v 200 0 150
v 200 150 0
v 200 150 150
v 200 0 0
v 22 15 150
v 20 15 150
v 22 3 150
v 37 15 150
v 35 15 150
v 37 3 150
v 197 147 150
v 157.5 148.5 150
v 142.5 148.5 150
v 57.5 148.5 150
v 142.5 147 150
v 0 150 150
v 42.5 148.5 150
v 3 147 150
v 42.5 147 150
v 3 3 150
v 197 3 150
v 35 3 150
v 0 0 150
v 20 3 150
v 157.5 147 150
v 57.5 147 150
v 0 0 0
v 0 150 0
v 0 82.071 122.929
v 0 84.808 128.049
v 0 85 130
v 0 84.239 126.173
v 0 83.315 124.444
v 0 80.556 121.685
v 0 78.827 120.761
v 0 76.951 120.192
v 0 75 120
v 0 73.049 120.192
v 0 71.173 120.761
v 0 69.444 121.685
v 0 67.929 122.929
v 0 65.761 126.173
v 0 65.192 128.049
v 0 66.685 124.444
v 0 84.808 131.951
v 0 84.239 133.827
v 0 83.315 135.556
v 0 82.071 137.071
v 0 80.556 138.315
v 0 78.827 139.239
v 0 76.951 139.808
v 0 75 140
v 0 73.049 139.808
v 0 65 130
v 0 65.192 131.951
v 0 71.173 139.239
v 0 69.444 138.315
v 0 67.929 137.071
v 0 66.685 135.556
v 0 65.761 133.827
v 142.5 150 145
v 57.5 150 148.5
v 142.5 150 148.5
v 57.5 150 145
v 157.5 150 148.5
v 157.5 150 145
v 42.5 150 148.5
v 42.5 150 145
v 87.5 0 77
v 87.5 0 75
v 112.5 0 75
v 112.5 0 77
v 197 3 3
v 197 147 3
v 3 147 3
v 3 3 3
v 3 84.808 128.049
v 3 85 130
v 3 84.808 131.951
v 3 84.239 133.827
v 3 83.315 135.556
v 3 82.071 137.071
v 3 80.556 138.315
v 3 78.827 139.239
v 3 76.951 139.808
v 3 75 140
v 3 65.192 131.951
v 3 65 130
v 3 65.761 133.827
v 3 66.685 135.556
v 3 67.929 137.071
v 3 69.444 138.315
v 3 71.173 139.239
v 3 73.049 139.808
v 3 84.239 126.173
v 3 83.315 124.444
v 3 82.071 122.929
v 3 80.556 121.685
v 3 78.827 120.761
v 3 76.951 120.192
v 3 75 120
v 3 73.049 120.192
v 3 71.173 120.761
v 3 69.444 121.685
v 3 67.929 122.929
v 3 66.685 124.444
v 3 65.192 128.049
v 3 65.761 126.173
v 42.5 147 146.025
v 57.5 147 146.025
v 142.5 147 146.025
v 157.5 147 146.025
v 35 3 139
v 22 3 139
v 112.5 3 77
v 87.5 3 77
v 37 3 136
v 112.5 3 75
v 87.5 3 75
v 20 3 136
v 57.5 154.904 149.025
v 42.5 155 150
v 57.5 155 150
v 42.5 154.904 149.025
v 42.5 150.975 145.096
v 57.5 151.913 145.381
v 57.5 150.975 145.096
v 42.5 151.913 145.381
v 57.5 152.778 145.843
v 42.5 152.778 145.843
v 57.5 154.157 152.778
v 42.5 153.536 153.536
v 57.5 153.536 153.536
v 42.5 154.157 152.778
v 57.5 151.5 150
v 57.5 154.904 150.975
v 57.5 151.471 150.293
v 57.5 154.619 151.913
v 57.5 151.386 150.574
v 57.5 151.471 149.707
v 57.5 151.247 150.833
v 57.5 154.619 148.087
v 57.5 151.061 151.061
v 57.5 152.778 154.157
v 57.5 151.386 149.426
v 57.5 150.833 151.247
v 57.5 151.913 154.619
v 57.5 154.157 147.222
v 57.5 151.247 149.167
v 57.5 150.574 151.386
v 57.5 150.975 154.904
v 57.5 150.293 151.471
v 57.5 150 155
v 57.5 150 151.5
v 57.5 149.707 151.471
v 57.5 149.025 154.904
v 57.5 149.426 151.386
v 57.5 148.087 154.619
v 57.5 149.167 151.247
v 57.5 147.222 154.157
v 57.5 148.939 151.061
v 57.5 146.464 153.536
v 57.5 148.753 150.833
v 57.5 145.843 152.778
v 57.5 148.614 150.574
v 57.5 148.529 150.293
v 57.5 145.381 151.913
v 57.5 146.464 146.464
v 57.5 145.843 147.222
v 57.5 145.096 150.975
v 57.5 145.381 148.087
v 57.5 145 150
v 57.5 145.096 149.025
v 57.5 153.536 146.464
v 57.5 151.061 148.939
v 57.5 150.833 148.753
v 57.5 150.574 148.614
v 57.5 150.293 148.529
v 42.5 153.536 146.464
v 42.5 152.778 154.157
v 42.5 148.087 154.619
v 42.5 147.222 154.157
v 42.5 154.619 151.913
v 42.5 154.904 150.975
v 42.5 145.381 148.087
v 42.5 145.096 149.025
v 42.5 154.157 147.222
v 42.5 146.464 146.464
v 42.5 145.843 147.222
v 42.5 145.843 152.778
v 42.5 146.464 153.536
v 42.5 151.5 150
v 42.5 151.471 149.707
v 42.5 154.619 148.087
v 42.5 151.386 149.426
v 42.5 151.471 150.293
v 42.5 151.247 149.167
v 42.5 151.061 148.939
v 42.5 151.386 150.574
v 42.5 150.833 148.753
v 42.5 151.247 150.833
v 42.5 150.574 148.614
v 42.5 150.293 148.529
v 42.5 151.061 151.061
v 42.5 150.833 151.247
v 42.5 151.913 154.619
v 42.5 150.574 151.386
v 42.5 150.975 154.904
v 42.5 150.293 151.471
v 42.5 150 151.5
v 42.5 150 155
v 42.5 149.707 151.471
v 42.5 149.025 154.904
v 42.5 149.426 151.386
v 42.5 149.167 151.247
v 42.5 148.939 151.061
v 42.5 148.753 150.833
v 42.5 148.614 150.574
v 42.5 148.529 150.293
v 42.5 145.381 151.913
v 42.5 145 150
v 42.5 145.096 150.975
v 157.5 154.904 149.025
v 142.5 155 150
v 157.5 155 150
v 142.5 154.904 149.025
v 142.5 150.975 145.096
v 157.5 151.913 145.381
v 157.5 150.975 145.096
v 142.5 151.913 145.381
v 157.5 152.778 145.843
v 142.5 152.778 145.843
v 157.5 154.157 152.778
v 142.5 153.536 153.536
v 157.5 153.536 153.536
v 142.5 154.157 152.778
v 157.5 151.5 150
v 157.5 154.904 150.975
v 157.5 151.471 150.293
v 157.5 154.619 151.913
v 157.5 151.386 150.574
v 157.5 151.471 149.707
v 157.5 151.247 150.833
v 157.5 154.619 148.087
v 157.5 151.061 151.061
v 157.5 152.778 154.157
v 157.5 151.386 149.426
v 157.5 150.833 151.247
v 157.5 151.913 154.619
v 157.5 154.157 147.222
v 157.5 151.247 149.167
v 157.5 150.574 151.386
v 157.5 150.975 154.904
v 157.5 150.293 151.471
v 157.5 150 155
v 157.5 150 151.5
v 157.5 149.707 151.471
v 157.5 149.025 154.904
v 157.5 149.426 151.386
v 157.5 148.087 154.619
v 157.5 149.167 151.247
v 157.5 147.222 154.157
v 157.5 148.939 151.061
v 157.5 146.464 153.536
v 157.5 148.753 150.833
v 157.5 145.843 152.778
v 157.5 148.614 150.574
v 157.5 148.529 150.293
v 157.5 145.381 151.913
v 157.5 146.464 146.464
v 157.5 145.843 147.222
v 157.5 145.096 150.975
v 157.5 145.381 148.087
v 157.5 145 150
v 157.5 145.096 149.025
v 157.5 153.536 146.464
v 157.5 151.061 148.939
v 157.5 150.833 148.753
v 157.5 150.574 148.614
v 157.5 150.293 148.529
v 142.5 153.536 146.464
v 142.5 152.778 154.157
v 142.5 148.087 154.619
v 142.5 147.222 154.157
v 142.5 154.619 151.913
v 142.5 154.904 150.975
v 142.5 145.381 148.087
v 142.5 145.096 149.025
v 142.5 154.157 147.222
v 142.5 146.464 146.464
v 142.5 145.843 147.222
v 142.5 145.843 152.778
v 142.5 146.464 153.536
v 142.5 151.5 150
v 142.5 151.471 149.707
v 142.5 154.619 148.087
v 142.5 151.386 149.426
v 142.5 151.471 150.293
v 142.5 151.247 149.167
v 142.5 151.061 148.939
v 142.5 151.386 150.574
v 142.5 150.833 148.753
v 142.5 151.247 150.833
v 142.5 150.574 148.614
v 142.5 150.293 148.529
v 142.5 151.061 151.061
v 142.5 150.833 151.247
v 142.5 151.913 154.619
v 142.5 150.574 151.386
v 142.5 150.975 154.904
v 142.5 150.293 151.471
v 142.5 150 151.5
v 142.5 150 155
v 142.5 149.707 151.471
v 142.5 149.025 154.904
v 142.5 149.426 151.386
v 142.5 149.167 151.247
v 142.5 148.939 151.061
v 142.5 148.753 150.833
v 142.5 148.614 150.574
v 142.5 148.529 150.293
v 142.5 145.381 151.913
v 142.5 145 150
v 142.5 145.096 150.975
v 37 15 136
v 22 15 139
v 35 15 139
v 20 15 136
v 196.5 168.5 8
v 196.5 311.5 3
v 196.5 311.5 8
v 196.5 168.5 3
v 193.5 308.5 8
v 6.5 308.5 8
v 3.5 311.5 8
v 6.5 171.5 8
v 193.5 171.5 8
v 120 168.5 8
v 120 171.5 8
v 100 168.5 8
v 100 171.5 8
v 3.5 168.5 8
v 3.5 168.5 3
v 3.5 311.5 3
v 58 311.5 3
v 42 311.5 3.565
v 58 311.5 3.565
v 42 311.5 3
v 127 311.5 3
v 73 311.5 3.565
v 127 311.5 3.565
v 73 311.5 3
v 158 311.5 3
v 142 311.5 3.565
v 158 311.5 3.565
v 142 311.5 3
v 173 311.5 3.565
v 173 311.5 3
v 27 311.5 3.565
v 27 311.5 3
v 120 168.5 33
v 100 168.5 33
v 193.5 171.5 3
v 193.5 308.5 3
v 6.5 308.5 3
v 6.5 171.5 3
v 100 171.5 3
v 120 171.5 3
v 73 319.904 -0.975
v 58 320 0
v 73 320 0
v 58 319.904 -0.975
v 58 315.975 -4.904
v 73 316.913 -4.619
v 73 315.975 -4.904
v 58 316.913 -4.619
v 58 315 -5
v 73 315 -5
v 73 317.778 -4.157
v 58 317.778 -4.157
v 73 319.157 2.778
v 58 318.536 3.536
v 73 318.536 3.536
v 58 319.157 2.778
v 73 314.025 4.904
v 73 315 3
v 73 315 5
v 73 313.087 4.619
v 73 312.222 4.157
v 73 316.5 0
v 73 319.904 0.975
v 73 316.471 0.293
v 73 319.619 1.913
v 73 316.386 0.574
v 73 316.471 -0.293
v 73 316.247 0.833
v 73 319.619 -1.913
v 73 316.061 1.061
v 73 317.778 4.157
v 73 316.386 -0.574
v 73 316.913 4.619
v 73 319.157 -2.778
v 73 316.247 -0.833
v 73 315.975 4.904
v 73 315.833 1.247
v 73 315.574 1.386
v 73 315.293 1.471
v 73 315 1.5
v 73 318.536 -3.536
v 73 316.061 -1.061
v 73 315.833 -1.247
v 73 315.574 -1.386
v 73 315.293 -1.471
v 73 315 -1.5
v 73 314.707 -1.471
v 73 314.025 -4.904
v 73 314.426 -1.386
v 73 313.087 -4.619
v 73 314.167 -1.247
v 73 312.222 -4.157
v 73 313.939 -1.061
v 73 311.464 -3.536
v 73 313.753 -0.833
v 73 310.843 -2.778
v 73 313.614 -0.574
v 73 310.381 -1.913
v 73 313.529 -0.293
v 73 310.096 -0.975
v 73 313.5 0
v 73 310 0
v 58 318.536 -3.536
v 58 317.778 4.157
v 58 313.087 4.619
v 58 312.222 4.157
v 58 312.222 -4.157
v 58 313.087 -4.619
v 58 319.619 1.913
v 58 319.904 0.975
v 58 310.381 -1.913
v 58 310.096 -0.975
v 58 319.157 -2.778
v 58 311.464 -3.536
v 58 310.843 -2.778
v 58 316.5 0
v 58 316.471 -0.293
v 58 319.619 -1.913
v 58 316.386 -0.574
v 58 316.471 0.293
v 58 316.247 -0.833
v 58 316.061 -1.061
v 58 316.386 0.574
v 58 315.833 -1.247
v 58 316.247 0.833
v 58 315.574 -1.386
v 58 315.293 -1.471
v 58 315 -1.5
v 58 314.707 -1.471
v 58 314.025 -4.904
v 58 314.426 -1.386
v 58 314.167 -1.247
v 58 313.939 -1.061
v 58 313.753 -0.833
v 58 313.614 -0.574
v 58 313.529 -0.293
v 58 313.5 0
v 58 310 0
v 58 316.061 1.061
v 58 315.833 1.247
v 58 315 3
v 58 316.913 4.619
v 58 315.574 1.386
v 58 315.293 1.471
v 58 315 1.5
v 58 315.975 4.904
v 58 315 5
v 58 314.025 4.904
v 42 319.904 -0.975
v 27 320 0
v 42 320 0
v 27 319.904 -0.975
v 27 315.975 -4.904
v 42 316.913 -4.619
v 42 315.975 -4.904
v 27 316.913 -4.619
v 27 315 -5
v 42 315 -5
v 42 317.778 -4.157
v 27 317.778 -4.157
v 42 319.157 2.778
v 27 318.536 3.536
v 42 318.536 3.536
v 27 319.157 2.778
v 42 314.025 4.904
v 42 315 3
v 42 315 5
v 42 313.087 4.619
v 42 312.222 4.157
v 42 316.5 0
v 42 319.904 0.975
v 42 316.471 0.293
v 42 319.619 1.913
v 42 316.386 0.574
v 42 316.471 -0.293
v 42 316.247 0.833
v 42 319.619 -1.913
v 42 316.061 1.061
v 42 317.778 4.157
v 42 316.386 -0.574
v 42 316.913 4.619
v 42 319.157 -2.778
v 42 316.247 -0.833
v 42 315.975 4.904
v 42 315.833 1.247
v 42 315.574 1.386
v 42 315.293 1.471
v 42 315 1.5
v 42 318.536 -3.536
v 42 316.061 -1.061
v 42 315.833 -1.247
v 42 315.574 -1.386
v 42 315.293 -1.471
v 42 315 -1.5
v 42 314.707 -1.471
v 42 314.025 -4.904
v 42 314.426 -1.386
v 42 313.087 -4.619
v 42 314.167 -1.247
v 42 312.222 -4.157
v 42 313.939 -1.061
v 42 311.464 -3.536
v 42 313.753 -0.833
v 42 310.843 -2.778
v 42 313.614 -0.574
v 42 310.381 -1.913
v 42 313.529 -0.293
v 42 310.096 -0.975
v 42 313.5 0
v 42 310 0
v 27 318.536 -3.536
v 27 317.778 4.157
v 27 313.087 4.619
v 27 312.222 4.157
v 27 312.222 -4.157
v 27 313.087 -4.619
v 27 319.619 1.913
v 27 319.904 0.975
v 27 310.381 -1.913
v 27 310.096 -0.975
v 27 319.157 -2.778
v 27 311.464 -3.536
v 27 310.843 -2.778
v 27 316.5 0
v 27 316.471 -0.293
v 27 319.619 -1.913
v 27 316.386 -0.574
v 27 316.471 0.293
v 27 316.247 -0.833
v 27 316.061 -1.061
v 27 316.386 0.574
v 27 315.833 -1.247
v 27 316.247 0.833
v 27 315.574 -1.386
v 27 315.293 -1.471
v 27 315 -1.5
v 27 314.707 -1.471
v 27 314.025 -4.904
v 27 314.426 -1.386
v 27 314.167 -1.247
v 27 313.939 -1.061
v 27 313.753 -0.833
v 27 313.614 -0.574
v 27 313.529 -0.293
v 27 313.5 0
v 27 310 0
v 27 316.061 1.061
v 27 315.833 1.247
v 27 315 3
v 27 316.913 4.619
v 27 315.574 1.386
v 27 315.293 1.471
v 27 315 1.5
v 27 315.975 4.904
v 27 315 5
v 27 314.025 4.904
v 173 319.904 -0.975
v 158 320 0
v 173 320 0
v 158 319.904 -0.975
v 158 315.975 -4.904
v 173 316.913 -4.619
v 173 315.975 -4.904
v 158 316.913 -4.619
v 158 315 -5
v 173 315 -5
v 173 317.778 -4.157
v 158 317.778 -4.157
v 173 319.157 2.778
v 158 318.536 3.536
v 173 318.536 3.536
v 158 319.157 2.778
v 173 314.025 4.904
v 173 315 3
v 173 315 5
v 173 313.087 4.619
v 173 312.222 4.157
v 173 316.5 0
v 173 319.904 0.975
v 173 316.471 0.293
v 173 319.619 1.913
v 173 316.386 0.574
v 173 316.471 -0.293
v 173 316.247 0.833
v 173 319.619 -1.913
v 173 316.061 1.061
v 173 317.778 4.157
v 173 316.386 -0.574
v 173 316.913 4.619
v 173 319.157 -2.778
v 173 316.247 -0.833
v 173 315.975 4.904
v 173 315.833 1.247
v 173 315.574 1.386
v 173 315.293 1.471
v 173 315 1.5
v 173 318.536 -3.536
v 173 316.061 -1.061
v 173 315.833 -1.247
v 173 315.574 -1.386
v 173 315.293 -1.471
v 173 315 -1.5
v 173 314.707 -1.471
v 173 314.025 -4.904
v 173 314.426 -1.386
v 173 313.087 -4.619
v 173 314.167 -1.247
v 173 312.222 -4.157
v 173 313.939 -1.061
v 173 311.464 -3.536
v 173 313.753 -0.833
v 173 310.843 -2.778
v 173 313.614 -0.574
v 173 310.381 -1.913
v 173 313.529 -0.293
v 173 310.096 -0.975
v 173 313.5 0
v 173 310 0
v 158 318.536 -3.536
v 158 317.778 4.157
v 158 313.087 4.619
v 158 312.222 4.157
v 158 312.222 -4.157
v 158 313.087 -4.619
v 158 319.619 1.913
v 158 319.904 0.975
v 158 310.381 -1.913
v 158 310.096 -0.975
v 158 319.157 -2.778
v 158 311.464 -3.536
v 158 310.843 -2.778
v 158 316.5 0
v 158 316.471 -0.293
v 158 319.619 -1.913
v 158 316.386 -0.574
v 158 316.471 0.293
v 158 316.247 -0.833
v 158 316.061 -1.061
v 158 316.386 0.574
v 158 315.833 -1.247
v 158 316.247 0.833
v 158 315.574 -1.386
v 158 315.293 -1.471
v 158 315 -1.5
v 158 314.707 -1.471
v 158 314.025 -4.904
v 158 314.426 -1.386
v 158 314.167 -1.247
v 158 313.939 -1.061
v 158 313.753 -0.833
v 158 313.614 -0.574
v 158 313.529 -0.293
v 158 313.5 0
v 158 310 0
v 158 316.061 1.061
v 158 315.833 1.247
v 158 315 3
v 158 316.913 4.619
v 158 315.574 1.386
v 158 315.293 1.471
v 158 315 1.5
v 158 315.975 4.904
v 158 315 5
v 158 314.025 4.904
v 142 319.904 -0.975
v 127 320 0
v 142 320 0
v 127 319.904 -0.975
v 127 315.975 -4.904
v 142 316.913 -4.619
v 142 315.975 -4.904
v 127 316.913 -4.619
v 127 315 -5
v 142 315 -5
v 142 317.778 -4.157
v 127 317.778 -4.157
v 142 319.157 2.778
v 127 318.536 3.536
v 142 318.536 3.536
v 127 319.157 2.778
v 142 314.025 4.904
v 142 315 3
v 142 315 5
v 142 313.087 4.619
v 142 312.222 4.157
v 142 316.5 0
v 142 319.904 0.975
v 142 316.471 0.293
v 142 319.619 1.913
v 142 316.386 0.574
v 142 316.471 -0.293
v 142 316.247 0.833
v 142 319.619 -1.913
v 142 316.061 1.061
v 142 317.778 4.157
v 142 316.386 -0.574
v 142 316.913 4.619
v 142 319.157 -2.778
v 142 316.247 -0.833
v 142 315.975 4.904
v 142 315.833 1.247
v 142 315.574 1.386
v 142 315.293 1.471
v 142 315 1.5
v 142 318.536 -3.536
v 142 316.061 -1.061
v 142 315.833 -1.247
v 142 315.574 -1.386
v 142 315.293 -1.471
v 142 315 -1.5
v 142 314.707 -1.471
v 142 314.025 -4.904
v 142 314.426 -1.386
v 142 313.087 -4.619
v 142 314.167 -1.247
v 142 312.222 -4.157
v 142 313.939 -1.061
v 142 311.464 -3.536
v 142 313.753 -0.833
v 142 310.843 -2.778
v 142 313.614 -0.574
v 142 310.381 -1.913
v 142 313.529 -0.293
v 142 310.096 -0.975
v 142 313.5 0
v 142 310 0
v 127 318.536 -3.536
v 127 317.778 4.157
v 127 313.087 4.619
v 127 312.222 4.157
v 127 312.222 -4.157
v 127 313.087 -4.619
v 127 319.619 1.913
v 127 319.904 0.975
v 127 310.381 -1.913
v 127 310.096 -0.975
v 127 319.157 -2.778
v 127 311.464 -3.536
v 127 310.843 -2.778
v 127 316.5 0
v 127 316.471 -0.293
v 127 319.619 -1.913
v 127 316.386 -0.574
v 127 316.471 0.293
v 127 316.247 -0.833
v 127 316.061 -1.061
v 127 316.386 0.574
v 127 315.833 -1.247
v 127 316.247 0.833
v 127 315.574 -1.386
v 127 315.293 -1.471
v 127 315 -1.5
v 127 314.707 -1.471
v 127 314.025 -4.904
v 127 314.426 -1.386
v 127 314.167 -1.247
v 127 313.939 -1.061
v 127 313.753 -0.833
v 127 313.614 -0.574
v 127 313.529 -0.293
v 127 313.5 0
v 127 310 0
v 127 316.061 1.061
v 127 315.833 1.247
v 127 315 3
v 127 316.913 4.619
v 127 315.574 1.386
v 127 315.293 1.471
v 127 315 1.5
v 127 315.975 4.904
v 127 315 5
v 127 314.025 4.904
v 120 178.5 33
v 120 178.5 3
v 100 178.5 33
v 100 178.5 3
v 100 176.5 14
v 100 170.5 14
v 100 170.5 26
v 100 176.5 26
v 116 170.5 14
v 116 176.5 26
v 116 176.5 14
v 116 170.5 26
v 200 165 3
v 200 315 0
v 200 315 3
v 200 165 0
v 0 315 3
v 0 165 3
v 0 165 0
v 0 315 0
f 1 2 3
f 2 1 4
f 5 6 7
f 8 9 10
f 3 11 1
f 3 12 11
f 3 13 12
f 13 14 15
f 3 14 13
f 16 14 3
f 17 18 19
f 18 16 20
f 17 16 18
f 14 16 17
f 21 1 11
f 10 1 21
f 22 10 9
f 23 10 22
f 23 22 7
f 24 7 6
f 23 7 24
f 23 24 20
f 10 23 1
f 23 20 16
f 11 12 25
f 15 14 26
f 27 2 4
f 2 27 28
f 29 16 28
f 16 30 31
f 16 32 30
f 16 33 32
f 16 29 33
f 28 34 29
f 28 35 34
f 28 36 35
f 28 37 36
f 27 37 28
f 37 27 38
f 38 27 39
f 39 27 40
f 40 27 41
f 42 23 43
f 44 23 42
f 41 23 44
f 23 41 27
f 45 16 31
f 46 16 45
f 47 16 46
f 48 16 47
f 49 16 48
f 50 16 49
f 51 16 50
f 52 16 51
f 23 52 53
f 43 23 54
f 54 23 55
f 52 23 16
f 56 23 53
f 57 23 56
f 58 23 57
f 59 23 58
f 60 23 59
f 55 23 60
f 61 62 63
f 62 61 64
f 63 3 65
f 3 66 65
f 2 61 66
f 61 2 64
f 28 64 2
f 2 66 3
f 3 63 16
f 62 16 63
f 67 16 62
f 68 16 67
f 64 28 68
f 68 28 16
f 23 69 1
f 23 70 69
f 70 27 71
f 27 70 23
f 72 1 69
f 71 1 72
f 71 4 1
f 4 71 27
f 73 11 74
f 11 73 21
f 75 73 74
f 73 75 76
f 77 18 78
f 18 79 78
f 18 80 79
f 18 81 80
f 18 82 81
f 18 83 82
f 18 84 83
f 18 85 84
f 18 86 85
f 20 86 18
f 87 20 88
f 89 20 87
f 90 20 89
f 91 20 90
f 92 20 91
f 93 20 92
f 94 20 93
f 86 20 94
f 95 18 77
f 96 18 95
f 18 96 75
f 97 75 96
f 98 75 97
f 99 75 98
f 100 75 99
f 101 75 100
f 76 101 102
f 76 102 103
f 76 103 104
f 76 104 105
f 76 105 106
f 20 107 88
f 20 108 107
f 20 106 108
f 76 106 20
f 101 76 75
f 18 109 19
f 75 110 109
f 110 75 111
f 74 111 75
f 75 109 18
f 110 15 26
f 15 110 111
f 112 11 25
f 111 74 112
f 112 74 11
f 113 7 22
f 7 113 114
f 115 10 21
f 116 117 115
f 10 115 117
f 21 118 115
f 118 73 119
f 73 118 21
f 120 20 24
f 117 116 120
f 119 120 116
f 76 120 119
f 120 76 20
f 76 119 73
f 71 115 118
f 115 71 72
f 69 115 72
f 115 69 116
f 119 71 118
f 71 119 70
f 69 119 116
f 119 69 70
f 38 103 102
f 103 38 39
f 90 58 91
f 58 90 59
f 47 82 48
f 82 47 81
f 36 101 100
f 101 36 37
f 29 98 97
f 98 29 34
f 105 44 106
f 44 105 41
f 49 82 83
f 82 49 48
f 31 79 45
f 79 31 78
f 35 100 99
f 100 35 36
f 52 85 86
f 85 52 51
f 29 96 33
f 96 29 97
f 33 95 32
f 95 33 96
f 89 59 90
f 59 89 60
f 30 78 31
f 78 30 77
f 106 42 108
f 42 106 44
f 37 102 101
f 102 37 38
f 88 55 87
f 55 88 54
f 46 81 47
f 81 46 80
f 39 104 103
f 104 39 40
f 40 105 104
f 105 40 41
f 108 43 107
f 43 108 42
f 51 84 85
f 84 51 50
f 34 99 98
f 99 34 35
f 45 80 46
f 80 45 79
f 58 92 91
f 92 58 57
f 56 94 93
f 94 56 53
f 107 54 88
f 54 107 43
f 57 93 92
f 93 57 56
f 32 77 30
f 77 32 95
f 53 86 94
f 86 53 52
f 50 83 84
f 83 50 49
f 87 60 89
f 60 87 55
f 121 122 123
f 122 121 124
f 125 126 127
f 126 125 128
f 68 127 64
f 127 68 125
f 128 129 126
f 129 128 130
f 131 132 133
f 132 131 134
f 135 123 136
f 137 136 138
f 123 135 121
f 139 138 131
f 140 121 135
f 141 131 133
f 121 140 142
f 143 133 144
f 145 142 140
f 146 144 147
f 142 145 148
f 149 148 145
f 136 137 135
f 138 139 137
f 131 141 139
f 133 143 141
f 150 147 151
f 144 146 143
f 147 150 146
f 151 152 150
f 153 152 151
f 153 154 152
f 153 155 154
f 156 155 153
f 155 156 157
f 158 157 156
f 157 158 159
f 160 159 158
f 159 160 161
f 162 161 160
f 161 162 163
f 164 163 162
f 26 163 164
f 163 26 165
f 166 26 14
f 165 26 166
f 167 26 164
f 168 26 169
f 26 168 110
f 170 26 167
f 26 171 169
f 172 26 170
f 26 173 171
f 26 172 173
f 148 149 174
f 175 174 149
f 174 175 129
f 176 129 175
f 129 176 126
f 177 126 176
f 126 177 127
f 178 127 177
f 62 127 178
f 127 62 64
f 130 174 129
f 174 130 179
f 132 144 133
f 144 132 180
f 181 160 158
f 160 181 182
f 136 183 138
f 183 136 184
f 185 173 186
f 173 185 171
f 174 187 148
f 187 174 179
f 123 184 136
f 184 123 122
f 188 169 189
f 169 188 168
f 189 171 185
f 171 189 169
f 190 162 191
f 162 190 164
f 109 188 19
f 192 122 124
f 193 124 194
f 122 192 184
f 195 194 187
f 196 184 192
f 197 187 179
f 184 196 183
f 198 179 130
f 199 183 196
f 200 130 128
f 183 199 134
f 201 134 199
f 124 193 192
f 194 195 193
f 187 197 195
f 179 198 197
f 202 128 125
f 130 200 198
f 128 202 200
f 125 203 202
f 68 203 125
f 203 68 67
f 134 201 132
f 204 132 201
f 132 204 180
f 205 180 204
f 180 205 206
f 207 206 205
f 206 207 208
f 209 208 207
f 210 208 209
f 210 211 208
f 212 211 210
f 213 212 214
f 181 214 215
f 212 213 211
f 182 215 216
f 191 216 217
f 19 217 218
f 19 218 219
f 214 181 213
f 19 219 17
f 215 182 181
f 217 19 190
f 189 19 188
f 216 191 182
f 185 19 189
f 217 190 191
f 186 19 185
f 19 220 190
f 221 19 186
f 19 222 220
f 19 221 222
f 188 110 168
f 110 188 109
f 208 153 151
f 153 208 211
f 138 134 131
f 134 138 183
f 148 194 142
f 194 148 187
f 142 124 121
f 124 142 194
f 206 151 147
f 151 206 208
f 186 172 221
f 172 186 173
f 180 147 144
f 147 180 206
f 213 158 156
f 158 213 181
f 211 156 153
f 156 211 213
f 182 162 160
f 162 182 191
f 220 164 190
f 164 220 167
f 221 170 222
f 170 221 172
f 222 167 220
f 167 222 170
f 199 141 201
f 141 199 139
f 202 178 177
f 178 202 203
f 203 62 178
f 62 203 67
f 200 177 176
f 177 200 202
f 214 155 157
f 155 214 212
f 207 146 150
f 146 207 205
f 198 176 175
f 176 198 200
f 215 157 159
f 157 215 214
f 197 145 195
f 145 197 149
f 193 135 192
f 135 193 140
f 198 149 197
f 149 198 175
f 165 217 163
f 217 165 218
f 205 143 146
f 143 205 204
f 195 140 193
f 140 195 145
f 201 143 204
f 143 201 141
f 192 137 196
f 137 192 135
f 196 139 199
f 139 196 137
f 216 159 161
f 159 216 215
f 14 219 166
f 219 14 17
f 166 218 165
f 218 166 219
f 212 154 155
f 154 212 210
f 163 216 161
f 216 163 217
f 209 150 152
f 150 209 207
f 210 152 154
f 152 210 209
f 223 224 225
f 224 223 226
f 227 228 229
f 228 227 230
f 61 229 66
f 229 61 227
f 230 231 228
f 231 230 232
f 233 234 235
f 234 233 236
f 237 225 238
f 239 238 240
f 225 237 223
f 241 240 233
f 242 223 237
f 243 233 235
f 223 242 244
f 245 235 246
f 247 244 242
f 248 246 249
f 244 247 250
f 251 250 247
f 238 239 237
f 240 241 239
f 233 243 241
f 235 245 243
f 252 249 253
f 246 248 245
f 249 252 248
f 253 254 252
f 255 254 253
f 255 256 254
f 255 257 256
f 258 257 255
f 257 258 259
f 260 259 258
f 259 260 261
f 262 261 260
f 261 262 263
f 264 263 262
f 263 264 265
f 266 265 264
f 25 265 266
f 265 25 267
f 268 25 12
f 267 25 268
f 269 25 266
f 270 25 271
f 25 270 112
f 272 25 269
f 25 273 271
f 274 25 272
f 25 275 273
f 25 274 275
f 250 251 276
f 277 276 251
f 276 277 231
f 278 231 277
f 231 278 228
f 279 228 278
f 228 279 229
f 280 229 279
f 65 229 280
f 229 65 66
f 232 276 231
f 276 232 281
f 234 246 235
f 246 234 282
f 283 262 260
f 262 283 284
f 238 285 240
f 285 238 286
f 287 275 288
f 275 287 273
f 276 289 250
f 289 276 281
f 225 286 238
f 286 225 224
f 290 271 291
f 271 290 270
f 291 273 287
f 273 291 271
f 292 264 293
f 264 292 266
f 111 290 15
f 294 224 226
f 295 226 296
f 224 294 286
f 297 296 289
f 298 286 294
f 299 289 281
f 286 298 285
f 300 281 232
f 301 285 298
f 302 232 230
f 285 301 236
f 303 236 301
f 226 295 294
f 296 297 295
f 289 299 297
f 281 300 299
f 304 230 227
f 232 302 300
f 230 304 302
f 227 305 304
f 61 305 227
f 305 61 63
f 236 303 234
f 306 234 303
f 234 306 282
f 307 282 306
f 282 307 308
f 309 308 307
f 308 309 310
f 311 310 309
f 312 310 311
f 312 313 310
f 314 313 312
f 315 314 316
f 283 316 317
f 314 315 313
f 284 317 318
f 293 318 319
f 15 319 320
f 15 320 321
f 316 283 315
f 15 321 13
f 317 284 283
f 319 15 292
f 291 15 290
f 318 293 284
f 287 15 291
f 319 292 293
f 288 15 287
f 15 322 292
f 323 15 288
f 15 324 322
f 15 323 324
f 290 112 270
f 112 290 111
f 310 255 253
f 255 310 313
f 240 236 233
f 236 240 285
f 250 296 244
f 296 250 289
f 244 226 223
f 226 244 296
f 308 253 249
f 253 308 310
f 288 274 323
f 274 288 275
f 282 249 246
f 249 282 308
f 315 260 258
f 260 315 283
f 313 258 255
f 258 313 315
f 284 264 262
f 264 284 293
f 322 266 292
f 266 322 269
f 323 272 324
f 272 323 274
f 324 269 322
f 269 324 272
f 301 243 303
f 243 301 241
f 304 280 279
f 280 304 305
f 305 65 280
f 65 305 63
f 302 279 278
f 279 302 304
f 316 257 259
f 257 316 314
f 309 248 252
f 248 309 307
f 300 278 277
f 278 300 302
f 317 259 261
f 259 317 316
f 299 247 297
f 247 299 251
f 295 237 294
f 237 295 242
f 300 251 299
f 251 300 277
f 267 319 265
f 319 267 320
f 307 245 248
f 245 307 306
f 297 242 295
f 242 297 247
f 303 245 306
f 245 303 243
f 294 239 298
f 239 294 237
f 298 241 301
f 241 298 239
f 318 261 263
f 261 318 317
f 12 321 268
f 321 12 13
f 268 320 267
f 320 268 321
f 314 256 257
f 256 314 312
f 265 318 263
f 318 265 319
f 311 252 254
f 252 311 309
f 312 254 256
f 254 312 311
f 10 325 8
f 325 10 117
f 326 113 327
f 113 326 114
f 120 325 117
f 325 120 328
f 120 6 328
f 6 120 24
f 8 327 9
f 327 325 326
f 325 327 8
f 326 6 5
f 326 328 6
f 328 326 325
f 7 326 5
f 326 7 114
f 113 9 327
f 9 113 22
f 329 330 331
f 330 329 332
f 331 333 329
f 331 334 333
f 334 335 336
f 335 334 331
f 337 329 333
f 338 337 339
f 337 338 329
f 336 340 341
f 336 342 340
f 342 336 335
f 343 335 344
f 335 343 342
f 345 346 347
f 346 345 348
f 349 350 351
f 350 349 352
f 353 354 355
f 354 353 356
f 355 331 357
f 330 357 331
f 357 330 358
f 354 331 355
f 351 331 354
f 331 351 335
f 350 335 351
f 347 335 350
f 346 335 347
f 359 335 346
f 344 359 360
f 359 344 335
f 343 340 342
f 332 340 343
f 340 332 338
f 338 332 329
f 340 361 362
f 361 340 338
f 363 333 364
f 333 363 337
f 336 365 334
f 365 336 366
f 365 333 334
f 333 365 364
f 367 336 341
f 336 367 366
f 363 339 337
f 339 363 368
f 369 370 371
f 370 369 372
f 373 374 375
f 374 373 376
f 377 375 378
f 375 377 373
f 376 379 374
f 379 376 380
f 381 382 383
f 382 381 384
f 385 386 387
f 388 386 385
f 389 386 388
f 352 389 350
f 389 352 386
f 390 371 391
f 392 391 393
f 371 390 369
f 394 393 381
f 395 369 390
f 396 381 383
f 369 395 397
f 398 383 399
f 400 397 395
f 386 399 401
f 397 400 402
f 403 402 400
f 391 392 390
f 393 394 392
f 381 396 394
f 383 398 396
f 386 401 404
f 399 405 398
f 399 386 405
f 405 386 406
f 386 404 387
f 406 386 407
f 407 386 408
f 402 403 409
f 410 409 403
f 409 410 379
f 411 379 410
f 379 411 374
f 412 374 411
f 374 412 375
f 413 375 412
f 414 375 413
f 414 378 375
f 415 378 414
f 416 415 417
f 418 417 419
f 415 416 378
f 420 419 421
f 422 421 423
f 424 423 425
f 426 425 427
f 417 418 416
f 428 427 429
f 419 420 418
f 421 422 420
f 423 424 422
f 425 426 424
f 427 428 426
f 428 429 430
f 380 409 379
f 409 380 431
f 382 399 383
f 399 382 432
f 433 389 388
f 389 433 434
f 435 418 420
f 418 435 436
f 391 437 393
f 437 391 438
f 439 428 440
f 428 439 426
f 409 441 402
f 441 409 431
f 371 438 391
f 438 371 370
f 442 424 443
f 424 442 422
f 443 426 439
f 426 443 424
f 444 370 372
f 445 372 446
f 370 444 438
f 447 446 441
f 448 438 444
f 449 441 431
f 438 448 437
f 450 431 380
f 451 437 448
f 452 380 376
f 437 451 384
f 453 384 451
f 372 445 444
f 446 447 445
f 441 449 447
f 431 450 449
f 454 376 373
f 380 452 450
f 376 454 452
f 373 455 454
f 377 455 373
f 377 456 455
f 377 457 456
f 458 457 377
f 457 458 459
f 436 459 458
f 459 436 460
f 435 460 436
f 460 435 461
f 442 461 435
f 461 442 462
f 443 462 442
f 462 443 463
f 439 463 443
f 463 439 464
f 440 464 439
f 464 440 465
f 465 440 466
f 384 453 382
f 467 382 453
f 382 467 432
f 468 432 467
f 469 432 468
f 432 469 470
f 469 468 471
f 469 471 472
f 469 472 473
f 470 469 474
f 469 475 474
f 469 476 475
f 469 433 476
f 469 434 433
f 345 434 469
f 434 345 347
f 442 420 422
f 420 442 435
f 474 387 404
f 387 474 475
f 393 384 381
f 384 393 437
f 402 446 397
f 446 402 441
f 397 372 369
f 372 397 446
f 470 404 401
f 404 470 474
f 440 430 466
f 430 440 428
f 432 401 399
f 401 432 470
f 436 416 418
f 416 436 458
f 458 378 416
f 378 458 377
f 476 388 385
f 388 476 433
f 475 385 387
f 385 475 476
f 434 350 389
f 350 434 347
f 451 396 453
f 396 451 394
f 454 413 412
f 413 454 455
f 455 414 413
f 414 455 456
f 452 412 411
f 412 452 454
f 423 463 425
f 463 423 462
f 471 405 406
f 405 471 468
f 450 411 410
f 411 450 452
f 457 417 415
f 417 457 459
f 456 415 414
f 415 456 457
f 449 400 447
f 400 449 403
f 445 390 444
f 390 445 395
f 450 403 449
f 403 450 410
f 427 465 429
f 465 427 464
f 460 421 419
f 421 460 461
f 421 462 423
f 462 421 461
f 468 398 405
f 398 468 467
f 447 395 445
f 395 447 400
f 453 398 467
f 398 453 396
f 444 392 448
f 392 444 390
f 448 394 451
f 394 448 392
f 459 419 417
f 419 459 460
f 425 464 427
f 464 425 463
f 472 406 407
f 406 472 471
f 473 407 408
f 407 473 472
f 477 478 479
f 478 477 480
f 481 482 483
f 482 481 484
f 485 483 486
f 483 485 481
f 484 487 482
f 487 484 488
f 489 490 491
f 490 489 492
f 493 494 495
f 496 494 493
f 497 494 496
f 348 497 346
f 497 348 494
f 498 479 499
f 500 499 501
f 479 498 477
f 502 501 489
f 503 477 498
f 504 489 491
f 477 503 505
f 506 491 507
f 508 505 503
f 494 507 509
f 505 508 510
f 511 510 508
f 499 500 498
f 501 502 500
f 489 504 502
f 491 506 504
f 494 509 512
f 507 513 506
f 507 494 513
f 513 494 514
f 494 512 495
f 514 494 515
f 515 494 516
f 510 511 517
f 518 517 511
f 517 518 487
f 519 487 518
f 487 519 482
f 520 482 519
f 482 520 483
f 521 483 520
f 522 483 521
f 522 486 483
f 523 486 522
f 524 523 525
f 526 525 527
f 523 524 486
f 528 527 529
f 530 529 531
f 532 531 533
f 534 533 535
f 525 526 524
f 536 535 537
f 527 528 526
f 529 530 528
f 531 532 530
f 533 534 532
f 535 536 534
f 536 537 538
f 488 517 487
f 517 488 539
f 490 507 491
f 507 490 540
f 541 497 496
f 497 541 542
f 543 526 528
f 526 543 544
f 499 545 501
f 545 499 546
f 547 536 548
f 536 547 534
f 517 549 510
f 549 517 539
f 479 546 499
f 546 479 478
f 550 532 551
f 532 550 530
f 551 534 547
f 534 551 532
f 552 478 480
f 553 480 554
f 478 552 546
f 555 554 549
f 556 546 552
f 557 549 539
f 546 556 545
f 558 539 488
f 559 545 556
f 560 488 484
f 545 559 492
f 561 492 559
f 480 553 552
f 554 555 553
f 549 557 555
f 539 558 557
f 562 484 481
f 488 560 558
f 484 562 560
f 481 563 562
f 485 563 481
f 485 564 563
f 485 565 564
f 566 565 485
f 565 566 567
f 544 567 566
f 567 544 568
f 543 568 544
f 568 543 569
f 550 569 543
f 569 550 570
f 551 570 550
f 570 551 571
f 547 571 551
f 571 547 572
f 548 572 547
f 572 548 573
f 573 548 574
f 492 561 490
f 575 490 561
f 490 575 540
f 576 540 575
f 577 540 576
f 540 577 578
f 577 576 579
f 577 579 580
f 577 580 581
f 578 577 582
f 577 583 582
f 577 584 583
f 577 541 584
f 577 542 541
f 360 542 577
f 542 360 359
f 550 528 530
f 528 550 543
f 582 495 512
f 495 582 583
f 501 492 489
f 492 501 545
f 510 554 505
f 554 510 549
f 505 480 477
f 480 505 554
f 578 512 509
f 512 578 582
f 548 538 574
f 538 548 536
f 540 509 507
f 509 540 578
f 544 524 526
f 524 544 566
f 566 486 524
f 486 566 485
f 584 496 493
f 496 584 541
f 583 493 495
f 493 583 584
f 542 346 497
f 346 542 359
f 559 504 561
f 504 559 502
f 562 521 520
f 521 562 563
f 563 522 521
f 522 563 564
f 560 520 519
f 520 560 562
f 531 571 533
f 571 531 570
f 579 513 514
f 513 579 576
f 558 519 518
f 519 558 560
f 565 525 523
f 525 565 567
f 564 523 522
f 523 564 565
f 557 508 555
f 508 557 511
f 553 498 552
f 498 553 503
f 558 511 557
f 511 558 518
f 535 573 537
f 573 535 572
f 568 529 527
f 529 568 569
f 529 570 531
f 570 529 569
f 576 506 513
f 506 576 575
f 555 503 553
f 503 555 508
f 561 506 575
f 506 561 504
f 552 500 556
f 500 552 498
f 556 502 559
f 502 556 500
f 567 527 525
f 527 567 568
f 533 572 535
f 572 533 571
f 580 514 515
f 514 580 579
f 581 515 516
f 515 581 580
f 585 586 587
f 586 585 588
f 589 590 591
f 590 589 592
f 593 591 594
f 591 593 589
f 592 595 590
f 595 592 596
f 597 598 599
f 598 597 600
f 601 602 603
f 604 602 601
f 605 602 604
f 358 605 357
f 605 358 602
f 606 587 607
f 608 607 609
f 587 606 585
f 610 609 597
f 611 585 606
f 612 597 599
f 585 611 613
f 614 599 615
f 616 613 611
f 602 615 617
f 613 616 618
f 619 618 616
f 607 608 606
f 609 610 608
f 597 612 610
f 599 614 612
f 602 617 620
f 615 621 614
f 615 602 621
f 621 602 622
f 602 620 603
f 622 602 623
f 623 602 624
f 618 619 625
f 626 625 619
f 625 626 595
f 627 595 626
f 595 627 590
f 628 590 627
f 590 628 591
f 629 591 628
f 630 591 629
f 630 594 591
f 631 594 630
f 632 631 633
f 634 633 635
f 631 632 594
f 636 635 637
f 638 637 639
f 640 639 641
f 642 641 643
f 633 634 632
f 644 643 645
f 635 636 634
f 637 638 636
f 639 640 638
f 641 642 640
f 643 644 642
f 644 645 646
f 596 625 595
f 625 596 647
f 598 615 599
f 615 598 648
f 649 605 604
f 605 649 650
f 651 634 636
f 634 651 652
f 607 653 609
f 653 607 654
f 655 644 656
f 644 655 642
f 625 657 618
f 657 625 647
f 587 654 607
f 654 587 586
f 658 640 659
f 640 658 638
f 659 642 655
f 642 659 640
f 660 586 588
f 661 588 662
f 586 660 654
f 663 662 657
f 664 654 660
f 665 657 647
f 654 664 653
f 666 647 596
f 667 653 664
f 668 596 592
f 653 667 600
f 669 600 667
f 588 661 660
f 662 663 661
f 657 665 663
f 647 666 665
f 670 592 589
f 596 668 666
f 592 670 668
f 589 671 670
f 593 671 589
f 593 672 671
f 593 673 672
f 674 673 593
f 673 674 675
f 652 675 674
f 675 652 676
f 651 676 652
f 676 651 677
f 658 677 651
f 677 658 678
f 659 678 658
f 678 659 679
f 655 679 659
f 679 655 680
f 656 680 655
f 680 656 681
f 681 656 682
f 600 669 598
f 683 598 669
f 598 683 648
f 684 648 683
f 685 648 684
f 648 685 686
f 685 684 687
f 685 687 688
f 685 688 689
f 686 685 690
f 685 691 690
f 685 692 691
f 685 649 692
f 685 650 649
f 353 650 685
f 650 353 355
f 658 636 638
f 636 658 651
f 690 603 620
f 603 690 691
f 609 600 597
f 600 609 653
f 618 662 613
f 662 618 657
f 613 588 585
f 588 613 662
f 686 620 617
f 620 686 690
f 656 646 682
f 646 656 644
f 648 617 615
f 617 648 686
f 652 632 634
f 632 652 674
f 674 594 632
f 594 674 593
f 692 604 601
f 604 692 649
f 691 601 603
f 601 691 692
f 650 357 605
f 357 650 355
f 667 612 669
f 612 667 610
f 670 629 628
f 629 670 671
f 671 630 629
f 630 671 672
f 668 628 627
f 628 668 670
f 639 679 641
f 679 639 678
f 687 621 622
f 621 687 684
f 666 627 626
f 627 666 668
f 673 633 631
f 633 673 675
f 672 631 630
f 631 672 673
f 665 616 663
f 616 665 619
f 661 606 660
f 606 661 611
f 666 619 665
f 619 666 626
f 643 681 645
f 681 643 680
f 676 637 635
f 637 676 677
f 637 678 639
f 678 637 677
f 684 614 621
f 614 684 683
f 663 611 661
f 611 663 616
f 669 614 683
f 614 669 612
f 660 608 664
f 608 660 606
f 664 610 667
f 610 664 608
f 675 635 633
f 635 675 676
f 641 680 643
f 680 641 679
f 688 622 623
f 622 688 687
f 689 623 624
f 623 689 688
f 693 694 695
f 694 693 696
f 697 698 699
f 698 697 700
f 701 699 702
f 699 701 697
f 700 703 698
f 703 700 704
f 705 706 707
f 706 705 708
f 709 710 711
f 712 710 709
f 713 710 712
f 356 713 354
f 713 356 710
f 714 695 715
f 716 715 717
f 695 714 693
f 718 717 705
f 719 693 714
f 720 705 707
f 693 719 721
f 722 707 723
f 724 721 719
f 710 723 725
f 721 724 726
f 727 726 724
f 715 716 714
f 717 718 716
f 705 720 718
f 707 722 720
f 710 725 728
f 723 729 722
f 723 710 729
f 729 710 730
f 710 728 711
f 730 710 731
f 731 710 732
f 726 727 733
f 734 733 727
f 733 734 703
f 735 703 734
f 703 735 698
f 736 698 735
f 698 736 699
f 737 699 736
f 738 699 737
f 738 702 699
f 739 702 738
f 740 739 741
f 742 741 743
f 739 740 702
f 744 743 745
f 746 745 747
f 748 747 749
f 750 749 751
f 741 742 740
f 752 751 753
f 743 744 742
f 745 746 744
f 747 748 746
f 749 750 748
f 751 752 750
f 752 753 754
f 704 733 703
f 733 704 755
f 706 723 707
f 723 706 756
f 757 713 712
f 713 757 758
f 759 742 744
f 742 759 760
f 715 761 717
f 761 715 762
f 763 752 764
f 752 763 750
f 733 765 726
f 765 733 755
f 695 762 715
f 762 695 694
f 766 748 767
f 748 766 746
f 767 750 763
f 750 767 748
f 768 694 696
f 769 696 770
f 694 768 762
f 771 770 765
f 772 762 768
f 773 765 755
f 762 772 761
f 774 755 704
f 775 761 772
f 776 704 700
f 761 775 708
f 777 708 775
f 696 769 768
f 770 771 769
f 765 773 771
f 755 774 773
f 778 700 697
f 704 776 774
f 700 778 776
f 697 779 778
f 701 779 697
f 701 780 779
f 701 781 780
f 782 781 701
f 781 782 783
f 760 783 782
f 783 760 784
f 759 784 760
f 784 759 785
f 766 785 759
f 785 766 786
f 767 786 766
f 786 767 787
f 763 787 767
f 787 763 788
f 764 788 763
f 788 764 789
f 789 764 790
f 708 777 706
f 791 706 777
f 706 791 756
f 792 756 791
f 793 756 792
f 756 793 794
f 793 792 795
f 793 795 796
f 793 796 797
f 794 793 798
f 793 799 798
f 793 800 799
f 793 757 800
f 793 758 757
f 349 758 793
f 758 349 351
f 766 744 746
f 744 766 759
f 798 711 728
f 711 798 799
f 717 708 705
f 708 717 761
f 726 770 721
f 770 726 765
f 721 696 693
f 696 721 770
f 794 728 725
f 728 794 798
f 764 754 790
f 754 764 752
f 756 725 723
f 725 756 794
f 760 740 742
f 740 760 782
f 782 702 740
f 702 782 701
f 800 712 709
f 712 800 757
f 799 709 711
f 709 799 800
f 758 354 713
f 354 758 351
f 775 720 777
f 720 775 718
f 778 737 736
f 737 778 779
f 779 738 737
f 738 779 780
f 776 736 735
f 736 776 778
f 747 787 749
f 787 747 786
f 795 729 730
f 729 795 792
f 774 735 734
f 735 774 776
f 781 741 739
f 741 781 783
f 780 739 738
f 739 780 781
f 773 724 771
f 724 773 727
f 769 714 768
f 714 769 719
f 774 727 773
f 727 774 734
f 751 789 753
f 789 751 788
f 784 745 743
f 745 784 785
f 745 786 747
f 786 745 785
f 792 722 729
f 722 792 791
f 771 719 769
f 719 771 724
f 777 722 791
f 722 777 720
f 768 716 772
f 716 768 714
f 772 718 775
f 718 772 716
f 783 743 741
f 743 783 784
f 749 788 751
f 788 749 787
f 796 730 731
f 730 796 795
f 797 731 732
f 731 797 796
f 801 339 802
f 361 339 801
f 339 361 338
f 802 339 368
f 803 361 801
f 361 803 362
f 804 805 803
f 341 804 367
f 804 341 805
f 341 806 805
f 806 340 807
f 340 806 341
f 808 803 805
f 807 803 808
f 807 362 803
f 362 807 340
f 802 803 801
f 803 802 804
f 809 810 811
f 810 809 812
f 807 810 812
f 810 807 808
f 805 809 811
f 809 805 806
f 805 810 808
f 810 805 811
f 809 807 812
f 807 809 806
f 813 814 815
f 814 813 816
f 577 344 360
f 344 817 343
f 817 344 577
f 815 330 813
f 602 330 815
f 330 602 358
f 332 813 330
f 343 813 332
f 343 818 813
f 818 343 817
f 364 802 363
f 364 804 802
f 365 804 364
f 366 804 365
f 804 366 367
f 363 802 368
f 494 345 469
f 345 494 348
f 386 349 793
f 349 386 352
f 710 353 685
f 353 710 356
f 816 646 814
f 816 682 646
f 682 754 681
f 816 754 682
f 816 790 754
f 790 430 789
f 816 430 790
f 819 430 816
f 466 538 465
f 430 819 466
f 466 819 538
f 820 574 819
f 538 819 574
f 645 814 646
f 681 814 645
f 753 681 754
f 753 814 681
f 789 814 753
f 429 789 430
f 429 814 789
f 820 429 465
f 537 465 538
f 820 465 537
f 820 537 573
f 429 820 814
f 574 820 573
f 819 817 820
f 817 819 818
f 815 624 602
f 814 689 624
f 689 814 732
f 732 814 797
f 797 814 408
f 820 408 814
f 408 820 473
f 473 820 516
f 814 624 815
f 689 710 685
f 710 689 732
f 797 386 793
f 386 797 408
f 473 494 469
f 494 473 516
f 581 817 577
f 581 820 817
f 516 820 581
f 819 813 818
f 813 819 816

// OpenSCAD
// Smart Delivery Bin - Main Enclosure and Lid (Printable Mechanics)
// All dimensions in millimeters (mm)

/* --- Parameters --- */
width = 200;
depth = 150;
height = 150;
wall = 3;

// OLED Cutout
oled_w = 26.5;
oled_h = 14.5;
oled_z = 90; 

// Keypad Ribbon Slit
slit_w = 25;
slit_h = 2;
slit_z = 75; 

// Solenoid Mount
solenoid_w = 27;
solenoid_d = 15;

// HC-SR04 Sensor Holes
sensor_hole_d = 16;
sensor_spacing = 25.5;

// Hinge Parameters
hinge_r = 5;
hinge_hole_r = 1.5; // 3mm diameter hole 
hinge_w = 15;

/* --- Modules --- */

module hinge_knuckle() {
    difference() {
        cylinder(r=hinge_r, h=hinge_w, $fn=32);
        translate([0,0,-1]) cylinder(r=hinge_hole_r, h=hinge_w+2, $fn=32);
    }
}

module main_box() {
    union() {
        difference() {
            // Outer solid box
            cube([width, depth, height]);
            
            // Inner hollow cavity
            translate([wall, wall, wall])
                cube([width - 2*wall, depth - 2*wall, height]); 
                
            // Keypad Ribbon Slit
            translate([width/2 - slit_w/2, -1, slit_z])
                cube([slit_w, wall+2, slit_h]);
                
            // Wire Routing Hole (Left Wall)
            // Allows wires to pass from the outside ESP32 to the inside lock/sensor
            translate([-1, depth/2, height - 20])
                rotate([0, 90, 0])
                cylinder(d=20, h=wall+2, $fn=32);
        }
        
        // The metal 12V Solenoid Lock will be screwed directly to the inside front wall here.
        // (Placeholder block removed so it doesn't physically block the actual lock!)
            
        // Box Hinges (Back wall, top edge)
        // Overlap perfectly with the back wall
        translate([width/4 - hinge_w/2, depth, height]) rotate([0, 90, 0]) hinge_knuckle();
        translate([3*width/4 - hinge_w/2, depth, height]) rotate([0, 90, 0]) hinge_knuckle();
        
        // Push Button Pocket (Limit Switch)
        // A U-shaped pocket that bridges perfectly when printed upside down!
        // Gives a 13x12mm recessed platform so a 12mm button sticks up exactly 1mm to be pressed by the lid.
        translate([20, wall, height - 14]) {
            cube([17, 12, 3]); // The shelf (bridges the gap)
            translate([0, 0, 3]) cube([2, 12, 11]); // Left pocket wall
            translate([15, 0, 3]) cube([2, 12, 11]); // Right pocket wall
        }
    }
}

module lid() {
    union() {
        difference() {
            // Lid Base 
            cube([width, depth, wall]);
        }
        
        // Inner lip to align the lid
        translate([wall + 0.5, wall + 0.5, wall - 0.1])
            difference() {
                cube([width - 2*wall - 1, depth - 2*wall - 1, 5.1]);
                translate([wall, wall, -1]) cube([width - 4*wall - 1, depth - 4*wall - 1, 7.1]); 
            }
            
        // Lid Hinges (Back wall)
        translate([width/4 + hinge_w/2 + 0.5, depth, 0]) rotate([0, 90, 0]) hinge_knuckle();
        translate([width/4 - hinge_w*1.5 - 0.5, depth, 0]) rotate([0, 90, 0]) hinge_knuckle();
        
        translate([3*width/4 + hinge_w/2 + 0.5, depth, 0]) rotate([0, 90, 0]) hinge_knuckle();
        translate([3*width/4 - hinge_w*1.5 - 0.5, depth, 0]) rotate([0, 90, 0]) hinge_knuckle();
        
        // Latch Hook (Shifted right in CAD, so when the lid flips over, it ends up on the left!)
        translate([width/2, wall + 0.5, wall - 1]) {
            difference() {
                // Elongated to 31mm so it reaches the lowered Solenoid lock
                cube([20, 10, 31]);
                // Hole must be open on the LEFT in CAD, so it is open on the RIGHT when flipped!
                translate([-1, 2, 12]) cube([17, 6, 12]); 
            }
        }
    }
}

// --- Render Setup ---
main_box();

// Move lid to the side for printing
translate([0, depth + 15, 0])
    lid();
